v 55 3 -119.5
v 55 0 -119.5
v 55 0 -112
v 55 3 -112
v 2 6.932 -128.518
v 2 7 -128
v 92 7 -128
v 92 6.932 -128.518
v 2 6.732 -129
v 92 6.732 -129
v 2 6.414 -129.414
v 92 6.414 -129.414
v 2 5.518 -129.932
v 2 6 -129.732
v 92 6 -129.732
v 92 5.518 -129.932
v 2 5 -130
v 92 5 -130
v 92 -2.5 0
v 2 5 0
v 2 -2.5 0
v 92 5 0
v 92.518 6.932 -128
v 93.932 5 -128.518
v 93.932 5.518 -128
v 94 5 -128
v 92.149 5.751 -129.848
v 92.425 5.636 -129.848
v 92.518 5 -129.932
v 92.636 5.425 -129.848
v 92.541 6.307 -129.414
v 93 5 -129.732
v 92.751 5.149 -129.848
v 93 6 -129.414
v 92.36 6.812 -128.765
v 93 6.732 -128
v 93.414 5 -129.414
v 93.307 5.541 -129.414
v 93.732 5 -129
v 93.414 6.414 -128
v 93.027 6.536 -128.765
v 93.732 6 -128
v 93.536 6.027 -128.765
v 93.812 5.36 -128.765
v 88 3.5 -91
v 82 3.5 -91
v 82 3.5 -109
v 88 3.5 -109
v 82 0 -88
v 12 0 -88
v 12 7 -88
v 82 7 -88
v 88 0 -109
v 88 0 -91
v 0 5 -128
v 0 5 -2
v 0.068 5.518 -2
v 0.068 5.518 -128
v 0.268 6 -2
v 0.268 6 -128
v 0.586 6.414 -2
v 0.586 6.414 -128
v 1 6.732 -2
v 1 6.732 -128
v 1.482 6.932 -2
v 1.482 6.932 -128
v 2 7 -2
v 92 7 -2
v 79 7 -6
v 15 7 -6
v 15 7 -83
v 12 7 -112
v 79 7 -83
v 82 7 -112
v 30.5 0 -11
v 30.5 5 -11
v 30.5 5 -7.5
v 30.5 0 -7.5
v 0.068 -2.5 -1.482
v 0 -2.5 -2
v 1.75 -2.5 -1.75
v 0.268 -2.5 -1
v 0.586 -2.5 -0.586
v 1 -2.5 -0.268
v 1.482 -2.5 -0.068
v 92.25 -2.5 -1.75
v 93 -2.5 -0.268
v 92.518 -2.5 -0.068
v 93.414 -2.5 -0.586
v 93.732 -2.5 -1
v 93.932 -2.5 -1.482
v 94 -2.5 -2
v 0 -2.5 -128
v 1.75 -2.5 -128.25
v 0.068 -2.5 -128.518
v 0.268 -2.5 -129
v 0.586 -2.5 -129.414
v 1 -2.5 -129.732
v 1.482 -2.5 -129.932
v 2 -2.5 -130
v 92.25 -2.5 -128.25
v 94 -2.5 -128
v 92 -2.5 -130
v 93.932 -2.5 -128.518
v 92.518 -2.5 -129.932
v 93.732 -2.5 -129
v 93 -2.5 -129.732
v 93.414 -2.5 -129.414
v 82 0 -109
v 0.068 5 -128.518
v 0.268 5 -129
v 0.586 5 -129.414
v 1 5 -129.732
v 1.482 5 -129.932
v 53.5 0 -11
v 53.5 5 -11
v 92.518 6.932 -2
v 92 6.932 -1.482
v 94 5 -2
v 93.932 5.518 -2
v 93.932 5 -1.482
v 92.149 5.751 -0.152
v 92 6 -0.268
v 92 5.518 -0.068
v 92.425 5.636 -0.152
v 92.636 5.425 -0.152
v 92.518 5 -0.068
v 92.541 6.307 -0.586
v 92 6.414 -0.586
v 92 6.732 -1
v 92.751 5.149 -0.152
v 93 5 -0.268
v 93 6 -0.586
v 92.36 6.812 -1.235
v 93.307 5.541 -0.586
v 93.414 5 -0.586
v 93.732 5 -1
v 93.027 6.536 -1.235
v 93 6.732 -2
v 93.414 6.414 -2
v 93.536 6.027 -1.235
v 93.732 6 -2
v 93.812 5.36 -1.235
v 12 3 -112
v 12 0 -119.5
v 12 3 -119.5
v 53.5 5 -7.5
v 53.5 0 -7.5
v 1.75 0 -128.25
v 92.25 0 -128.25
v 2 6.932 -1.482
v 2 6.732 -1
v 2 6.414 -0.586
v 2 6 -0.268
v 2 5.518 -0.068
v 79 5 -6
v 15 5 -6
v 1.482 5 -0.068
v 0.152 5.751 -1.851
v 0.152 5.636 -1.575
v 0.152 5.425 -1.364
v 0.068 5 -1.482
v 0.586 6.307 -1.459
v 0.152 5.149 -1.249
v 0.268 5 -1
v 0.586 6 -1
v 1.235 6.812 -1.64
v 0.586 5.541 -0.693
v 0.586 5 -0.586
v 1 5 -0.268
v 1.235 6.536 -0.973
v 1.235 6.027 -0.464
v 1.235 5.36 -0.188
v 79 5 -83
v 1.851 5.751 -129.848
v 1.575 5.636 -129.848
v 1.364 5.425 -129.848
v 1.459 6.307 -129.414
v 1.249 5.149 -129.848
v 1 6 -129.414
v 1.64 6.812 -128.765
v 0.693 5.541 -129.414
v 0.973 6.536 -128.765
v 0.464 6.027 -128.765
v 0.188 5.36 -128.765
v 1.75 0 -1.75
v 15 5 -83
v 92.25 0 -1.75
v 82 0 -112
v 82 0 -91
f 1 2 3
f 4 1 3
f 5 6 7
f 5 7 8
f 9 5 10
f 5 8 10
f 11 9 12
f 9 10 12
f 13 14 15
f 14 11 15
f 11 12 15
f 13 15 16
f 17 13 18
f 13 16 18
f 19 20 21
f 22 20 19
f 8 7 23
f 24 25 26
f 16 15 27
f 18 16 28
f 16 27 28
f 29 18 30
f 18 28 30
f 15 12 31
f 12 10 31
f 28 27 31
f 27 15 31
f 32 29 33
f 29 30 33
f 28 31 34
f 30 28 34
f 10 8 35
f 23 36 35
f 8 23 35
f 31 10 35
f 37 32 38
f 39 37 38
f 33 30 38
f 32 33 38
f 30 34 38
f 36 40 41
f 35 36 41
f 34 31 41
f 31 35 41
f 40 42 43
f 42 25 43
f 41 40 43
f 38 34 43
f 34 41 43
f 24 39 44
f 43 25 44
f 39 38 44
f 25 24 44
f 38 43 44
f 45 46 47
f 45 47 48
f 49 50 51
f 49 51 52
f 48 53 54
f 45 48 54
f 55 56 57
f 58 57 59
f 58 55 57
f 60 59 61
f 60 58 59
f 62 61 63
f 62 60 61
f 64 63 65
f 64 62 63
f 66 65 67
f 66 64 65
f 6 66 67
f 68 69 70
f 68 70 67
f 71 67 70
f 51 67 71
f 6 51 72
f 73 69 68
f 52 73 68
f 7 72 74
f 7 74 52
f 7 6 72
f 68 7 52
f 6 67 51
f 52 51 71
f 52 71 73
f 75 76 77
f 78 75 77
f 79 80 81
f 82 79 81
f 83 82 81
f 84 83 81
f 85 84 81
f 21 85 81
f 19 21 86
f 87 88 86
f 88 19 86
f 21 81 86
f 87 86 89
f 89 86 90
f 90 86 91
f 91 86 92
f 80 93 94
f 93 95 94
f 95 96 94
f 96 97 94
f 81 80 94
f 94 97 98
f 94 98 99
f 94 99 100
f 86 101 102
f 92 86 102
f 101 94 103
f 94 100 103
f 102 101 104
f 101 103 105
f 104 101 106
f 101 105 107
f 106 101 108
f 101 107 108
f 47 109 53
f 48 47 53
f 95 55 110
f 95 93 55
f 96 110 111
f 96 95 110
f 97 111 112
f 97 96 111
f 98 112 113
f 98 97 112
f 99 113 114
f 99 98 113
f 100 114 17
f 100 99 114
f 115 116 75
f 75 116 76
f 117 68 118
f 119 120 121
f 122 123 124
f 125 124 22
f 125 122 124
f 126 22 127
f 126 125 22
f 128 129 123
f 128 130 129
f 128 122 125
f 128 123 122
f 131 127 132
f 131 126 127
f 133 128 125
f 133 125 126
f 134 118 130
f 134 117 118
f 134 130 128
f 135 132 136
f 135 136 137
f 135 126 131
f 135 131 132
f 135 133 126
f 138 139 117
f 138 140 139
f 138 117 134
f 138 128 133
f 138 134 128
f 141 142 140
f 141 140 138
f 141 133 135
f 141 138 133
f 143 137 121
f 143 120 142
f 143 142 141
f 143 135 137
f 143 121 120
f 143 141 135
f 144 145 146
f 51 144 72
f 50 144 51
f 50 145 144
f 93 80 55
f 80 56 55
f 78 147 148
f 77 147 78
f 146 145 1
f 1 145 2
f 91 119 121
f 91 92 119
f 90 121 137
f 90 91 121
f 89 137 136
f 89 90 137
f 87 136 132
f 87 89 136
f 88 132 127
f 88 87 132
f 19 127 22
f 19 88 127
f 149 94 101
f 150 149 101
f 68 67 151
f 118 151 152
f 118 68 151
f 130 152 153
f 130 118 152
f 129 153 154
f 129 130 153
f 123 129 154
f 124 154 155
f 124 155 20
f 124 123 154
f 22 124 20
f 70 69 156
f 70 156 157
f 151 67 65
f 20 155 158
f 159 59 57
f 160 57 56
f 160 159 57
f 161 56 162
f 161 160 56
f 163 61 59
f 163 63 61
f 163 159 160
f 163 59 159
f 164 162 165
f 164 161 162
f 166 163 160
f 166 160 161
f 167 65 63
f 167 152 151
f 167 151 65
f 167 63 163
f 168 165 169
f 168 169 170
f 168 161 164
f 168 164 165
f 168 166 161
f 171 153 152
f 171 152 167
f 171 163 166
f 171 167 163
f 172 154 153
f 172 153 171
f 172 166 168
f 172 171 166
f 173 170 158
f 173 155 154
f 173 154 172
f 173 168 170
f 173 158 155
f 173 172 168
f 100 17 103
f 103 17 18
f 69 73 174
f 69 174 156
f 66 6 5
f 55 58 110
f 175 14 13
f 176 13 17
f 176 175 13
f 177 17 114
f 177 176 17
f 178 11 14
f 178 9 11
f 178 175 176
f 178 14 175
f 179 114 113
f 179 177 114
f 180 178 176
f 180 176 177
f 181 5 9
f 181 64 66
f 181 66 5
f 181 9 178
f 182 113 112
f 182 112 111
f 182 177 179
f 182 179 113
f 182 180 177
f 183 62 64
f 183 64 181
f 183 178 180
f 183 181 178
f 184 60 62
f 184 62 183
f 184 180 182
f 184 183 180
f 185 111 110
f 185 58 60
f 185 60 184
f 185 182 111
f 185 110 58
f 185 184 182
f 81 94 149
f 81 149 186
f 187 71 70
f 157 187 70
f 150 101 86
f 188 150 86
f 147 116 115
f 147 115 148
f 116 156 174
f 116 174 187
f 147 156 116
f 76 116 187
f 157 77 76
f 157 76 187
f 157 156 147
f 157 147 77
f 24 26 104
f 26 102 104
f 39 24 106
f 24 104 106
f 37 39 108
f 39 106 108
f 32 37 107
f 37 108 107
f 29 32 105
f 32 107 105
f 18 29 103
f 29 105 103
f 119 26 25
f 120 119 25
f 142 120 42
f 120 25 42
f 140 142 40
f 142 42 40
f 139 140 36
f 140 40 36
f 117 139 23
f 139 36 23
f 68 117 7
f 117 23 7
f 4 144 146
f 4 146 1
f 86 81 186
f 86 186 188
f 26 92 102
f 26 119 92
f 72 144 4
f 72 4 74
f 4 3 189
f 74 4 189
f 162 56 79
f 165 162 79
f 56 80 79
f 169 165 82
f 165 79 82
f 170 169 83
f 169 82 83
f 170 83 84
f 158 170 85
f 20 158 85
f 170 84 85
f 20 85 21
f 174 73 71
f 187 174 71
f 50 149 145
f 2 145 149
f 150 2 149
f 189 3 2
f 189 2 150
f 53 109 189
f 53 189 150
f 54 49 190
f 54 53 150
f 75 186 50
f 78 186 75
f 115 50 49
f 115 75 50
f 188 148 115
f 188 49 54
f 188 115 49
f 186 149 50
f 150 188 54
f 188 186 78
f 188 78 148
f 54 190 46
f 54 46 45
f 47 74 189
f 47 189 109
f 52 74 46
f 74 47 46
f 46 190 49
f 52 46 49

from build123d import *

# Parameters (mm, degrees)
SKETCH1_W           = 94
SKETCH1_H           = 130
BOSS_EXTRUDE1_DEPTH = 9.5
SKETCH2_W           = 90.5
SKETCH2_H           = 126.5
CUT_EXTRUDE1_DEPTH  = 2.5
SKETCH3_W           = 70
SKETCH3_H           = 24
CUT_EXTRUDE2_DEPTH  = 8
SKETCH4_W           = 64
SKETCH4_H           = 77
CUT_EXTRUDE3_DEPTH  = 2
SKETCH5_W           = 23
SKETCH5_H           = 3.5
CUT_EXTRUDE4_DEPTH  = 8.5
SKETCH6_W           = 6
SKETCH6_H           = 18
CUT_EXTRUDE5_DEPTH  = 3.5
SKETCH7_W           = 43
SKETCH7_H           = 7.5
CUT_EXTRUDE6_DEPTH  = 3
FILLET1_R           = 2


with BuildPart() as part:
    # Sketch1 → Boss-Extrude1 (new body)
    with BuildSketch(Plane(origin=(0, 7, 0), x_dir=(1, 0, 0), z_dir=(0, 1, 0))):
        with Locations((47, 65)):
            Rectangle(SKETCH1_W, SKETCH1_H)
    extrude(amount=-BOSS_EXTRUDE1_DEPTH)

    # Sketch2 → Cut-Extrude1 (cut)
    with BuildSketch(Plane.XZ.offset(2.5)):
        with Locations((47, -65)):
            Rectangle(SKETCH2_W, SKETCH2_H)
    extrude(amount=-CUT_EXTRUDE1_DEPTH, mode=Mode.SUBTRACT)

    # Sketch3 → Cut-Extrude2 (cut, through all)
    with BuildSketch(Plane.XZ):
        with Locations((47, -100)):
            Rectangle(SKETCH3_W, SKETCH3_H)
    extrude(amount=-CUT_EXTRUDE2_DEPTH, mode=Mode.SUBTRACT)

    # Sketch4 → Cut-Extrude3 (cut)
    with BuildSketch(Plane(origin=(0, 7, 0), x_dir=(-1, 0, 0), z_dir=(0, 1, 0))):
        with Locations((-47, -44.5)):
            Rectangle(SKETCH4_W, SKETCH4_H)
    extrude(amount=-CUT_EXTRUDE3_DEPTH, mode=Mode.SUBTRACT)

    # Sketch5 → Cut-Extrude4 (cut, through all)
    with BuildSketch(Plane(origin=(0, 5, 0), x_dir=(-1, 0, 0), z_dir=(0, 1, 0))):
        with Locations((-42, -9.25)):
            Rectangle(SKETCH5_W, SKETCH5_H)
    extrude(amount=-CUT_EXTRUDE4_DEPTH, mode=Mode.SUBTRACT)

    # Sketch6 → Cut-Extrude5 (cut)
    with BuildSketch(Plane.XZ):
        with Locations((85, -100)):
            Rectangle(SKETCH6_W, SKETCH6_H)
    extrude(amount=-CUT_EXTRUDE5_DEPTH, mode=Mode.SUBTRACT)

    # Sketch7 → Cut-Extrude6 (cut)
    with BuildSketch(Plane.XZ):
        with Locations((33.5, -115.75)):
            Rectangle(SKETCH7_W, SKETCH7_H)
    extrude(amount=-CUT_EXTRUDE6_DEPTH, mode=Mode.SUBTRACT)

    # Fillet1
    fillet1_edges = [part.edges().sort_by_distance(p)[0] for p in [
        (94, 7, -65),
        (47, 7, 0),
        (0, 7, -65),
        (47, 7, -130),
        (94, 2.25, -130),
        (94, 2.25, 0),
        (0, 2.25, 0),
        (0, 2.25, -130),
    ]]
    fillet(fillet1_edges, radius=FILLET1_R)


solid = part.part
